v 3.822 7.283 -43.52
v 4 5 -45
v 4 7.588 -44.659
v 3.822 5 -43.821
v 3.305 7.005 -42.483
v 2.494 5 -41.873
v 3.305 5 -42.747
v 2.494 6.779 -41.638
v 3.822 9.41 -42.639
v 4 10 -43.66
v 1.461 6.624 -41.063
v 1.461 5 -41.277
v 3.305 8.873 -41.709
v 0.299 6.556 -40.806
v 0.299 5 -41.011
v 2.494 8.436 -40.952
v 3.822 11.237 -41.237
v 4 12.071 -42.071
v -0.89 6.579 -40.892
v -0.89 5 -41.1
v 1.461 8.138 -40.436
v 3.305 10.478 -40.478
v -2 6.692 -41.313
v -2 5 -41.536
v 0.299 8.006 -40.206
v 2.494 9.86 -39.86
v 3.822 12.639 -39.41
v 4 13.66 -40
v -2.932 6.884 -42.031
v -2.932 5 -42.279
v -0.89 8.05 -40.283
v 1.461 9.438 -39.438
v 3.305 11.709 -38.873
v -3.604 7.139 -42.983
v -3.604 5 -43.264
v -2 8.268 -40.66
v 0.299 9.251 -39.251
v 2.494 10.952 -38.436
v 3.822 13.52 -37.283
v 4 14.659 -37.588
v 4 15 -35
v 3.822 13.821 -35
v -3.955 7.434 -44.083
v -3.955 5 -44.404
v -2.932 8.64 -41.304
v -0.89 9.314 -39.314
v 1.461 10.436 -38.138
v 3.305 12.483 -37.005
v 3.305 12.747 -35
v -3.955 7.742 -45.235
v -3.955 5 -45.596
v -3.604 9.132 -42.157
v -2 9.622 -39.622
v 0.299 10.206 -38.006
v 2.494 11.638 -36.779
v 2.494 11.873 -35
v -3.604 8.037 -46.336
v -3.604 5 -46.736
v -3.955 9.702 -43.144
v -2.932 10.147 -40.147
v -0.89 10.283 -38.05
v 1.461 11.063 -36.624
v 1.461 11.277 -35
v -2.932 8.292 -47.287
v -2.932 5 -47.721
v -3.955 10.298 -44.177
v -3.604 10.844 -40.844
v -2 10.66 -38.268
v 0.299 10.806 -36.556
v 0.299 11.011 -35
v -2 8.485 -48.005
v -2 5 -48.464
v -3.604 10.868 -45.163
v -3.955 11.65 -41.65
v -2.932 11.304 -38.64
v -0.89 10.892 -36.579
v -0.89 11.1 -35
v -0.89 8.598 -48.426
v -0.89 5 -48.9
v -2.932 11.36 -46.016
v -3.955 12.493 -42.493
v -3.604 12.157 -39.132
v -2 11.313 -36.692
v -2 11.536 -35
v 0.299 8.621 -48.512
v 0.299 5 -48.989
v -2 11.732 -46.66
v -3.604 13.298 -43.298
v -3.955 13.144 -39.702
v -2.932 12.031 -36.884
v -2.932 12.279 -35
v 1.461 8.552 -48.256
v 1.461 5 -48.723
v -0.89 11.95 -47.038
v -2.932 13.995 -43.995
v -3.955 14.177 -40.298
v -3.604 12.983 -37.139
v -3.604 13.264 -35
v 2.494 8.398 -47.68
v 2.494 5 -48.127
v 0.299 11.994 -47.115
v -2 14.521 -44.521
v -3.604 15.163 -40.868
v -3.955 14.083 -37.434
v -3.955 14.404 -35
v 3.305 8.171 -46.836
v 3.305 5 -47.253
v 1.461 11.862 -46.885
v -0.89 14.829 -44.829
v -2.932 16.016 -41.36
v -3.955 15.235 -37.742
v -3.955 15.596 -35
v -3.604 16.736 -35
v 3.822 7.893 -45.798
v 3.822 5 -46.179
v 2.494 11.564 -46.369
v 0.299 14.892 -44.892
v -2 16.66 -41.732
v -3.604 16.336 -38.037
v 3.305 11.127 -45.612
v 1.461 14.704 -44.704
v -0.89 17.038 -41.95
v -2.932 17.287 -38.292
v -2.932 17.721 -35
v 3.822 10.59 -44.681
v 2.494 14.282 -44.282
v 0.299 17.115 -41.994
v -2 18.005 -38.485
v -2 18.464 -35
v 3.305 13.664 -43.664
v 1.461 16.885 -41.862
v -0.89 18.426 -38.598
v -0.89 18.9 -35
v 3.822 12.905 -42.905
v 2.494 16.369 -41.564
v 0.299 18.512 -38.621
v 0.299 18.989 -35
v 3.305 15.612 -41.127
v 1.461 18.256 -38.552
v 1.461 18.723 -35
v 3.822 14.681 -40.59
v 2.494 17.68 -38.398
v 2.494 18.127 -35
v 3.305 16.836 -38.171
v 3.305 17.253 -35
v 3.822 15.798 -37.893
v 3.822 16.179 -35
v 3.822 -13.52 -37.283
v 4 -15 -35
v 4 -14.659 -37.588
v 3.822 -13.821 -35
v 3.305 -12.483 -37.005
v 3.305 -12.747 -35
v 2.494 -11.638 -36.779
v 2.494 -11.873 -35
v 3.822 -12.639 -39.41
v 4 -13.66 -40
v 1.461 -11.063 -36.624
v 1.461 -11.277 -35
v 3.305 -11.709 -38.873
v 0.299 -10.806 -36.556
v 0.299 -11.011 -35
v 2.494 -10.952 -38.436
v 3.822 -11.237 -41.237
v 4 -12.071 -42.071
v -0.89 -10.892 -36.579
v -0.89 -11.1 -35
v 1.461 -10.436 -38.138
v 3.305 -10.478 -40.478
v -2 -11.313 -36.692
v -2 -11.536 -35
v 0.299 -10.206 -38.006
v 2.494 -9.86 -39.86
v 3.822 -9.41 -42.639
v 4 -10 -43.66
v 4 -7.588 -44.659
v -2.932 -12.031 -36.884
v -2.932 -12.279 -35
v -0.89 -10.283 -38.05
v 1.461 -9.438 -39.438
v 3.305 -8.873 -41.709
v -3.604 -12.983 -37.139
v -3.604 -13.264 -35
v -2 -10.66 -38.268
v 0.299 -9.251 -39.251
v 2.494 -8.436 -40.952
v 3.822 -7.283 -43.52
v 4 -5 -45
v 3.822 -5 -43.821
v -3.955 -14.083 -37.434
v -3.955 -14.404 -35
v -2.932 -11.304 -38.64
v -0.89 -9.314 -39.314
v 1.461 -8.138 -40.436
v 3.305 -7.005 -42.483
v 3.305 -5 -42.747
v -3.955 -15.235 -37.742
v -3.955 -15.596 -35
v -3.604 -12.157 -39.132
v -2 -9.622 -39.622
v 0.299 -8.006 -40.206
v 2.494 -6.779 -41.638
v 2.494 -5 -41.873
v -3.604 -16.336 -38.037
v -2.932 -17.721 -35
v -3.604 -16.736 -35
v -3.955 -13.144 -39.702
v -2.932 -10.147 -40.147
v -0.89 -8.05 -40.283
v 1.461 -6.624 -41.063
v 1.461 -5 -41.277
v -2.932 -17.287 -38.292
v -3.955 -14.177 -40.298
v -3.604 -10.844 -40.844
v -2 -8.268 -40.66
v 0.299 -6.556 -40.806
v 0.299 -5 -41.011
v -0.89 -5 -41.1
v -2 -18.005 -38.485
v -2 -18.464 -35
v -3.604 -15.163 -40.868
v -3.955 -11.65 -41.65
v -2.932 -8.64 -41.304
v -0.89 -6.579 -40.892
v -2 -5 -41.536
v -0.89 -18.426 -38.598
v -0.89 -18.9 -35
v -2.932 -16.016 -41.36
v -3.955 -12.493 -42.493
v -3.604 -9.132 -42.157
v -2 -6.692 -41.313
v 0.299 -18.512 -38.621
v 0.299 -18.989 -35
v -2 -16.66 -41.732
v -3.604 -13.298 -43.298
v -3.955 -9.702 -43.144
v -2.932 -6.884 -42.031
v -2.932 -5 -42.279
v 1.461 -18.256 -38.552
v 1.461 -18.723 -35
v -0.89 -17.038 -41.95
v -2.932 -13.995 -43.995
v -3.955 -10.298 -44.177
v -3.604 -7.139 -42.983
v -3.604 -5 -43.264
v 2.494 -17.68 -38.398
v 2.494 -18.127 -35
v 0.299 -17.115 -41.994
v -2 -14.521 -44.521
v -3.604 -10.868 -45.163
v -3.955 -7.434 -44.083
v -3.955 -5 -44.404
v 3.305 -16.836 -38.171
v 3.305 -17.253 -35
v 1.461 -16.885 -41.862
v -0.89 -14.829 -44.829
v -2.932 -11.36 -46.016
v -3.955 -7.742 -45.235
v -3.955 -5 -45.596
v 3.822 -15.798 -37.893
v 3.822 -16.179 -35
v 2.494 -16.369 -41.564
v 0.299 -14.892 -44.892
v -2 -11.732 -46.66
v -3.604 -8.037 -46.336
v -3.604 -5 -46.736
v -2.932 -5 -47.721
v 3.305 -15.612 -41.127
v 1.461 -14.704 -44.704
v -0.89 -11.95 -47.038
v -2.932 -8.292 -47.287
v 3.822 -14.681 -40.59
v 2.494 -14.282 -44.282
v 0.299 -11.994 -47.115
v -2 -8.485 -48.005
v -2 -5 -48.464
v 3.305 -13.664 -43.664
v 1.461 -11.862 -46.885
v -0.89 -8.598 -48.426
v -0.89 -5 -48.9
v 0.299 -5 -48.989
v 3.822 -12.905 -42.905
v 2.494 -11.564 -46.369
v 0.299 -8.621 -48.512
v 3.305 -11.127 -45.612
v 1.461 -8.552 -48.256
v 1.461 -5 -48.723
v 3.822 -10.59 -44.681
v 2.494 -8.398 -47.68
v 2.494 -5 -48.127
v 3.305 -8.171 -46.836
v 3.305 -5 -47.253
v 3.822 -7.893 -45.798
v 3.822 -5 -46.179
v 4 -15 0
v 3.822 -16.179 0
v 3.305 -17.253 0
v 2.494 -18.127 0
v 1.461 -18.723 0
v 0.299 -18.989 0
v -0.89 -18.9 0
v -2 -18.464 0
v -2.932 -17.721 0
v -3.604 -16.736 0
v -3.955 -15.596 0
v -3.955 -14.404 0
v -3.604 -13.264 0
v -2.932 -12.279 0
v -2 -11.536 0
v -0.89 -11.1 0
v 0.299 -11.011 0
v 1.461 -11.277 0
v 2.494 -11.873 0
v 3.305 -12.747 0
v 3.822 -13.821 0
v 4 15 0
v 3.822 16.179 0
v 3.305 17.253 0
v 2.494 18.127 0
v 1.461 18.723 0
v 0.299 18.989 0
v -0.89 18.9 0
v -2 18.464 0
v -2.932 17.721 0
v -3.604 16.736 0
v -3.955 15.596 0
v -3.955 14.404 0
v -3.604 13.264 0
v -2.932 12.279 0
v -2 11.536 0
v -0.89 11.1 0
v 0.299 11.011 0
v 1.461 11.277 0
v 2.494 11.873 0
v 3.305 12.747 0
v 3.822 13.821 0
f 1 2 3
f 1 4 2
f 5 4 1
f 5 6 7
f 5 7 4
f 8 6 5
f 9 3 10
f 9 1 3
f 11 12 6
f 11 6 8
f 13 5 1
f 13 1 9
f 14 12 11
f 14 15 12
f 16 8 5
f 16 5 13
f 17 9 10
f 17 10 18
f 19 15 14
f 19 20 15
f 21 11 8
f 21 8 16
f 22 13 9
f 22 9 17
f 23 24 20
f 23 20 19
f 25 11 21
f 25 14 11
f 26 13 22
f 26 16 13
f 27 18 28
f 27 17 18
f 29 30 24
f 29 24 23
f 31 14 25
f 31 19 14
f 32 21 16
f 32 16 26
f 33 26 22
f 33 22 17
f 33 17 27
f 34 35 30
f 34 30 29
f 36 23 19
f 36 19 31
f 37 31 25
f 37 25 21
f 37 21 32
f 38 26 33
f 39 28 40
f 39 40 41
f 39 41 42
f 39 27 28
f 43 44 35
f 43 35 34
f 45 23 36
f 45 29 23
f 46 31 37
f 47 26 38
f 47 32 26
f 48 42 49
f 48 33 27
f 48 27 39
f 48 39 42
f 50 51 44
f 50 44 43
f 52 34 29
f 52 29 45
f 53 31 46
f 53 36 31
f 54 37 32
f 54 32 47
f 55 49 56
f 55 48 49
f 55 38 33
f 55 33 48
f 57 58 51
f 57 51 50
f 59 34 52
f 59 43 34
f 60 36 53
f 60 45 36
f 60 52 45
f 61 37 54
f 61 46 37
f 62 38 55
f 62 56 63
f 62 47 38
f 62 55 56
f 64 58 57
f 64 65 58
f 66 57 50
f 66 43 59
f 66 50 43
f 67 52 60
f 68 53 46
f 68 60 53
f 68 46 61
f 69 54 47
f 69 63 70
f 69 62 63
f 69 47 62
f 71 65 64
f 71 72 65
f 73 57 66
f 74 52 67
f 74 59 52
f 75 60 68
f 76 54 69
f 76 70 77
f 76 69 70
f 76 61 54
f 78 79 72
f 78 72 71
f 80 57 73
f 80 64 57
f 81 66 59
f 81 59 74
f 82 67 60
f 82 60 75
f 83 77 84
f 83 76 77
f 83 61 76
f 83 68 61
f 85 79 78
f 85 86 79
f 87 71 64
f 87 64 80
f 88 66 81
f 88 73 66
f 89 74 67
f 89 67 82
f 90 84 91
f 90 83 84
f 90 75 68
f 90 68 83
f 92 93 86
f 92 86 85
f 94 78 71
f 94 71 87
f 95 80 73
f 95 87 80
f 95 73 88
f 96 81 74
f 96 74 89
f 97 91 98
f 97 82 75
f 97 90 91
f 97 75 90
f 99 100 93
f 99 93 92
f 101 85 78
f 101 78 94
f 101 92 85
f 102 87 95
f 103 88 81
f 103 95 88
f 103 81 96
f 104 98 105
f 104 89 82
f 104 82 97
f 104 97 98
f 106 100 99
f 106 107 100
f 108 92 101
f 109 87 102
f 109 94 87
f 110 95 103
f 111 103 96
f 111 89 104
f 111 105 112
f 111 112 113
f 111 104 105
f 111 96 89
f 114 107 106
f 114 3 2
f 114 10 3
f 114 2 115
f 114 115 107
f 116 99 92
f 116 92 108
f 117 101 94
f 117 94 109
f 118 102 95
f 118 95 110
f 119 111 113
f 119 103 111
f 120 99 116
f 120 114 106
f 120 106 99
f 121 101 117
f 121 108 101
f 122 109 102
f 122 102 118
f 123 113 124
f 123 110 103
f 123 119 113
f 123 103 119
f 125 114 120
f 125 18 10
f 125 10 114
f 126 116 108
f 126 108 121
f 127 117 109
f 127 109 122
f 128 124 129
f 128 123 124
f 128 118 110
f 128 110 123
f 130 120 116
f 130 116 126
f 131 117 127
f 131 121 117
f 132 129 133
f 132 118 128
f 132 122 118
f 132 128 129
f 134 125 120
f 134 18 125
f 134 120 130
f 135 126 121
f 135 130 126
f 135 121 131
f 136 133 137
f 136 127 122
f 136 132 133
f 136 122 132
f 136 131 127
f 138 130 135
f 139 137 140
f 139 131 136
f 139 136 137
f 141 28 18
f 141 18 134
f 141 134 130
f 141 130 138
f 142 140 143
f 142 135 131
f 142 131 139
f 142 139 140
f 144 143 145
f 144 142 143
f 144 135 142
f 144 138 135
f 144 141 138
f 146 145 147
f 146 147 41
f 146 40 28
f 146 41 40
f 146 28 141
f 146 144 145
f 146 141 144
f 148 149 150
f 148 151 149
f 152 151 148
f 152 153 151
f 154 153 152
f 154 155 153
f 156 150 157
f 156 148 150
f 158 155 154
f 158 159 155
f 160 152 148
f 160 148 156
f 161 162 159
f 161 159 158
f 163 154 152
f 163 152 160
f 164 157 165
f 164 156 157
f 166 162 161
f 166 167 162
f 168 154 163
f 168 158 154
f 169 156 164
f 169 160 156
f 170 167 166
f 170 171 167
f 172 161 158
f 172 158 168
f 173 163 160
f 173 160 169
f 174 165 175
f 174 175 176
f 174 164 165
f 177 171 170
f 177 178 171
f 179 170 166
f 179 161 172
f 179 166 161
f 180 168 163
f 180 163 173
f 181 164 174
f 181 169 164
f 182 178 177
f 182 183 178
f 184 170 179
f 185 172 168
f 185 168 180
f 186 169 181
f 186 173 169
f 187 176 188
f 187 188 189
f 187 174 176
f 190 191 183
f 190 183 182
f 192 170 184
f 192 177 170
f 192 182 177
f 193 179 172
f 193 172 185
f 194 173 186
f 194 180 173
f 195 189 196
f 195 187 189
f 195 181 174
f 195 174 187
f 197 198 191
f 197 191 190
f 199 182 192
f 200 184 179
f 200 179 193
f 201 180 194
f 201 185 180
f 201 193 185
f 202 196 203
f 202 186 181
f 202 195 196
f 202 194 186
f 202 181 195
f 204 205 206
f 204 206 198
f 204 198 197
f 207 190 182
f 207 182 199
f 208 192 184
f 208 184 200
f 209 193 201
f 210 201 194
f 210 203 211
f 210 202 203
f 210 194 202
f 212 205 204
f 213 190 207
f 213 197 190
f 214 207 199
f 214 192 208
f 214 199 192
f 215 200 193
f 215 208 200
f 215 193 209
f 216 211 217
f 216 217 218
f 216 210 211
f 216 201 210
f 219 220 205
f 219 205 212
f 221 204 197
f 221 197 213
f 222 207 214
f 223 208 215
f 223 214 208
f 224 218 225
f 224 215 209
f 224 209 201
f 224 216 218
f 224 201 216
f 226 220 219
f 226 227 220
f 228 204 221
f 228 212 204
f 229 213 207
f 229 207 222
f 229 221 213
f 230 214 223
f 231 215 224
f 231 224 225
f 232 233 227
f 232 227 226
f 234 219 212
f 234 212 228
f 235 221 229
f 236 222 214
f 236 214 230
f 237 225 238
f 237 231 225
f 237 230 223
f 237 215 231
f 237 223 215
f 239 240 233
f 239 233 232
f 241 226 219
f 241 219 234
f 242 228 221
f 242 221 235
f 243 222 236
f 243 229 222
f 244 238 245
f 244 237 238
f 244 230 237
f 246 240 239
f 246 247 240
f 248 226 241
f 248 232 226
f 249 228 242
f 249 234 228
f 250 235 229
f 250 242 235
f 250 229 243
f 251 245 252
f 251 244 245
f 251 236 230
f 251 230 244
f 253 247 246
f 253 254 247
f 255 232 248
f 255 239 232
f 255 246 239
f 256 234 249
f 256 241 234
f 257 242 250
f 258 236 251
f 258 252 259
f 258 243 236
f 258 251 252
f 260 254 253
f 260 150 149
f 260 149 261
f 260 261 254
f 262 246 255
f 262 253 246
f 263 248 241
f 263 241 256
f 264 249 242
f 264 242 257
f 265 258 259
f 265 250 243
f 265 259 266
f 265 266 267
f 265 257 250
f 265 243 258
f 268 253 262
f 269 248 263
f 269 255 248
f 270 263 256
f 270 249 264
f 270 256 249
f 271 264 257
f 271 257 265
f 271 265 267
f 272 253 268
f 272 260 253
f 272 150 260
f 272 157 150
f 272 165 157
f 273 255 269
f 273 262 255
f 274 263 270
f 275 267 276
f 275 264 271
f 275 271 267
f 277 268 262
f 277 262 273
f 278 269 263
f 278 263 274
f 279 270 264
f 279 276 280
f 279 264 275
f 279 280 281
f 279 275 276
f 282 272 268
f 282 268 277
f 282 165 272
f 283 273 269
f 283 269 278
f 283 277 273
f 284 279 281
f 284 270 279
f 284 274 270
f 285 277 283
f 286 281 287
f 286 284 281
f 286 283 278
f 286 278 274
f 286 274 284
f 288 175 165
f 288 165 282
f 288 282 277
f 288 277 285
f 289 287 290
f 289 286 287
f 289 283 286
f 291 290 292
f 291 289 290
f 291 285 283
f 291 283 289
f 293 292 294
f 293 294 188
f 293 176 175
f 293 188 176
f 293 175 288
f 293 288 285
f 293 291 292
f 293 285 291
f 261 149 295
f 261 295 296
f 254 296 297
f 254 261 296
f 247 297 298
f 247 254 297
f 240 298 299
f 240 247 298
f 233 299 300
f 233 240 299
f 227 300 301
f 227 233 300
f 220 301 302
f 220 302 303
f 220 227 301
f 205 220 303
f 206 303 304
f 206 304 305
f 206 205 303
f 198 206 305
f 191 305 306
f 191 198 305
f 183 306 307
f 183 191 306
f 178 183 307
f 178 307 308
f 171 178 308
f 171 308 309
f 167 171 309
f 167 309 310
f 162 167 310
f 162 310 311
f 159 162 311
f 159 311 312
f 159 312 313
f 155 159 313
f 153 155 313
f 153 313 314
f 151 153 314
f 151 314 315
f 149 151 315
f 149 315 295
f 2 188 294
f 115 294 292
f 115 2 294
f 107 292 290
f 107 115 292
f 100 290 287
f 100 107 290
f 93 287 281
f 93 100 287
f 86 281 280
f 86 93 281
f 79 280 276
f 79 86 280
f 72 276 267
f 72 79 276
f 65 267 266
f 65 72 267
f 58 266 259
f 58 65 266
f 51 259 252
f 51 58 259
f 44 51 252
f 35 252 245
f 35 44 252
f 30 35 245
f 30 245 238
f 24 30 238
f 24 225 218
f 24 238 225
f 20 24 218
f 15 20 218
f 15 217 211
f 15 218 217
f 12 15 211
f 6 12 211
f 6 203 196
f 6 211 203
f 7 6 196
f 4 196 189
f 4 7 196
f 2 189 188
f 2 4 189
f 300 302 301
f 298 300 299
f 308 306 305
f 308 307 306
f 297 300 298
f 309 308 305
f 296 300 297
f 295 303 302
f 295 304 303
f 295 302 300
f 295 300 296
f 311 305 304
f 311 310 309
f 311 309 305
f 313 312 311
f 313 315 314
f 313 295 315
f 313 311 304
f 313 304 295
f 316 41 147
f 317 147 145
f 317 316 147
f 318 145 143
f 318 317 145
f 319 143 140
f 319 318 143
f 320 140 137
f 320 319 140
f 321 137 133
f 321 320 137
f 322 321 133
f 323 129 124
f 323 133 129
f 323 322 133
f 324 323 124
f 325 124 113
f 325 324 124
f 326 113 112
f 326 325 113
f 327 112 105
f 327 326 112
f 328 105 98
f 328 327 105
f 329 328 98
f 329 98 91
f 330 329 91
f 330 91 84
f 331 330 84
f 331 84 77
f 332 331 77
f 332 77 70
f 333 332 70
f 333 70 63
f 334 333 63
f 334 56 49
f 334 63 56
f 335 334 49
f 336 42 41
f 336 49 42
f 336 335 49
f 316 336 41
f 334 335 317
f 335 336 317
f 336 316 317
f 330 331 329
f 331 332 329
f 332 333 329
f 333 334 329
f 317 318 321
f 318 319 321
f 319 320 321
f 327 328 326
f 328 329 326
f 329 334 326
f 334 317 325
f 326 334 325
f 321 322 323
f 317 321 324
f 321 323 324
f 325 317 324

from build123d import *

# Parameters (mm, degrees)
SKETCH_2_R = 4


with BuildPart() as part:
    # По траектории1: sweep along a path in Эскиз1
    with BuildLine(Plane(origin=(0, 0, 0), x_dir=(0, 0, -1), z_dir=(1, 0, 0))) as sweep_1_path:
        Line((0, -15), (35, -15))
        ThreePointArc((35, -15), (42.071067812, -12.071067812), (45, -5))
        Line((45, -5), (45, 5))
        ThreePointArc((45, 5), (42.071067812, 12.071067812), (35, 15))
        Line((35, 15), (0, 15))
    # Эскиз2 → По траектории1 (sweep)
    with BuildSketch(Plane.XY):
        with Locations((0, -15)):
            Circle(SKETCH_2_R)
    sweep(path=sweep_1_path.line)


solid = part.part
